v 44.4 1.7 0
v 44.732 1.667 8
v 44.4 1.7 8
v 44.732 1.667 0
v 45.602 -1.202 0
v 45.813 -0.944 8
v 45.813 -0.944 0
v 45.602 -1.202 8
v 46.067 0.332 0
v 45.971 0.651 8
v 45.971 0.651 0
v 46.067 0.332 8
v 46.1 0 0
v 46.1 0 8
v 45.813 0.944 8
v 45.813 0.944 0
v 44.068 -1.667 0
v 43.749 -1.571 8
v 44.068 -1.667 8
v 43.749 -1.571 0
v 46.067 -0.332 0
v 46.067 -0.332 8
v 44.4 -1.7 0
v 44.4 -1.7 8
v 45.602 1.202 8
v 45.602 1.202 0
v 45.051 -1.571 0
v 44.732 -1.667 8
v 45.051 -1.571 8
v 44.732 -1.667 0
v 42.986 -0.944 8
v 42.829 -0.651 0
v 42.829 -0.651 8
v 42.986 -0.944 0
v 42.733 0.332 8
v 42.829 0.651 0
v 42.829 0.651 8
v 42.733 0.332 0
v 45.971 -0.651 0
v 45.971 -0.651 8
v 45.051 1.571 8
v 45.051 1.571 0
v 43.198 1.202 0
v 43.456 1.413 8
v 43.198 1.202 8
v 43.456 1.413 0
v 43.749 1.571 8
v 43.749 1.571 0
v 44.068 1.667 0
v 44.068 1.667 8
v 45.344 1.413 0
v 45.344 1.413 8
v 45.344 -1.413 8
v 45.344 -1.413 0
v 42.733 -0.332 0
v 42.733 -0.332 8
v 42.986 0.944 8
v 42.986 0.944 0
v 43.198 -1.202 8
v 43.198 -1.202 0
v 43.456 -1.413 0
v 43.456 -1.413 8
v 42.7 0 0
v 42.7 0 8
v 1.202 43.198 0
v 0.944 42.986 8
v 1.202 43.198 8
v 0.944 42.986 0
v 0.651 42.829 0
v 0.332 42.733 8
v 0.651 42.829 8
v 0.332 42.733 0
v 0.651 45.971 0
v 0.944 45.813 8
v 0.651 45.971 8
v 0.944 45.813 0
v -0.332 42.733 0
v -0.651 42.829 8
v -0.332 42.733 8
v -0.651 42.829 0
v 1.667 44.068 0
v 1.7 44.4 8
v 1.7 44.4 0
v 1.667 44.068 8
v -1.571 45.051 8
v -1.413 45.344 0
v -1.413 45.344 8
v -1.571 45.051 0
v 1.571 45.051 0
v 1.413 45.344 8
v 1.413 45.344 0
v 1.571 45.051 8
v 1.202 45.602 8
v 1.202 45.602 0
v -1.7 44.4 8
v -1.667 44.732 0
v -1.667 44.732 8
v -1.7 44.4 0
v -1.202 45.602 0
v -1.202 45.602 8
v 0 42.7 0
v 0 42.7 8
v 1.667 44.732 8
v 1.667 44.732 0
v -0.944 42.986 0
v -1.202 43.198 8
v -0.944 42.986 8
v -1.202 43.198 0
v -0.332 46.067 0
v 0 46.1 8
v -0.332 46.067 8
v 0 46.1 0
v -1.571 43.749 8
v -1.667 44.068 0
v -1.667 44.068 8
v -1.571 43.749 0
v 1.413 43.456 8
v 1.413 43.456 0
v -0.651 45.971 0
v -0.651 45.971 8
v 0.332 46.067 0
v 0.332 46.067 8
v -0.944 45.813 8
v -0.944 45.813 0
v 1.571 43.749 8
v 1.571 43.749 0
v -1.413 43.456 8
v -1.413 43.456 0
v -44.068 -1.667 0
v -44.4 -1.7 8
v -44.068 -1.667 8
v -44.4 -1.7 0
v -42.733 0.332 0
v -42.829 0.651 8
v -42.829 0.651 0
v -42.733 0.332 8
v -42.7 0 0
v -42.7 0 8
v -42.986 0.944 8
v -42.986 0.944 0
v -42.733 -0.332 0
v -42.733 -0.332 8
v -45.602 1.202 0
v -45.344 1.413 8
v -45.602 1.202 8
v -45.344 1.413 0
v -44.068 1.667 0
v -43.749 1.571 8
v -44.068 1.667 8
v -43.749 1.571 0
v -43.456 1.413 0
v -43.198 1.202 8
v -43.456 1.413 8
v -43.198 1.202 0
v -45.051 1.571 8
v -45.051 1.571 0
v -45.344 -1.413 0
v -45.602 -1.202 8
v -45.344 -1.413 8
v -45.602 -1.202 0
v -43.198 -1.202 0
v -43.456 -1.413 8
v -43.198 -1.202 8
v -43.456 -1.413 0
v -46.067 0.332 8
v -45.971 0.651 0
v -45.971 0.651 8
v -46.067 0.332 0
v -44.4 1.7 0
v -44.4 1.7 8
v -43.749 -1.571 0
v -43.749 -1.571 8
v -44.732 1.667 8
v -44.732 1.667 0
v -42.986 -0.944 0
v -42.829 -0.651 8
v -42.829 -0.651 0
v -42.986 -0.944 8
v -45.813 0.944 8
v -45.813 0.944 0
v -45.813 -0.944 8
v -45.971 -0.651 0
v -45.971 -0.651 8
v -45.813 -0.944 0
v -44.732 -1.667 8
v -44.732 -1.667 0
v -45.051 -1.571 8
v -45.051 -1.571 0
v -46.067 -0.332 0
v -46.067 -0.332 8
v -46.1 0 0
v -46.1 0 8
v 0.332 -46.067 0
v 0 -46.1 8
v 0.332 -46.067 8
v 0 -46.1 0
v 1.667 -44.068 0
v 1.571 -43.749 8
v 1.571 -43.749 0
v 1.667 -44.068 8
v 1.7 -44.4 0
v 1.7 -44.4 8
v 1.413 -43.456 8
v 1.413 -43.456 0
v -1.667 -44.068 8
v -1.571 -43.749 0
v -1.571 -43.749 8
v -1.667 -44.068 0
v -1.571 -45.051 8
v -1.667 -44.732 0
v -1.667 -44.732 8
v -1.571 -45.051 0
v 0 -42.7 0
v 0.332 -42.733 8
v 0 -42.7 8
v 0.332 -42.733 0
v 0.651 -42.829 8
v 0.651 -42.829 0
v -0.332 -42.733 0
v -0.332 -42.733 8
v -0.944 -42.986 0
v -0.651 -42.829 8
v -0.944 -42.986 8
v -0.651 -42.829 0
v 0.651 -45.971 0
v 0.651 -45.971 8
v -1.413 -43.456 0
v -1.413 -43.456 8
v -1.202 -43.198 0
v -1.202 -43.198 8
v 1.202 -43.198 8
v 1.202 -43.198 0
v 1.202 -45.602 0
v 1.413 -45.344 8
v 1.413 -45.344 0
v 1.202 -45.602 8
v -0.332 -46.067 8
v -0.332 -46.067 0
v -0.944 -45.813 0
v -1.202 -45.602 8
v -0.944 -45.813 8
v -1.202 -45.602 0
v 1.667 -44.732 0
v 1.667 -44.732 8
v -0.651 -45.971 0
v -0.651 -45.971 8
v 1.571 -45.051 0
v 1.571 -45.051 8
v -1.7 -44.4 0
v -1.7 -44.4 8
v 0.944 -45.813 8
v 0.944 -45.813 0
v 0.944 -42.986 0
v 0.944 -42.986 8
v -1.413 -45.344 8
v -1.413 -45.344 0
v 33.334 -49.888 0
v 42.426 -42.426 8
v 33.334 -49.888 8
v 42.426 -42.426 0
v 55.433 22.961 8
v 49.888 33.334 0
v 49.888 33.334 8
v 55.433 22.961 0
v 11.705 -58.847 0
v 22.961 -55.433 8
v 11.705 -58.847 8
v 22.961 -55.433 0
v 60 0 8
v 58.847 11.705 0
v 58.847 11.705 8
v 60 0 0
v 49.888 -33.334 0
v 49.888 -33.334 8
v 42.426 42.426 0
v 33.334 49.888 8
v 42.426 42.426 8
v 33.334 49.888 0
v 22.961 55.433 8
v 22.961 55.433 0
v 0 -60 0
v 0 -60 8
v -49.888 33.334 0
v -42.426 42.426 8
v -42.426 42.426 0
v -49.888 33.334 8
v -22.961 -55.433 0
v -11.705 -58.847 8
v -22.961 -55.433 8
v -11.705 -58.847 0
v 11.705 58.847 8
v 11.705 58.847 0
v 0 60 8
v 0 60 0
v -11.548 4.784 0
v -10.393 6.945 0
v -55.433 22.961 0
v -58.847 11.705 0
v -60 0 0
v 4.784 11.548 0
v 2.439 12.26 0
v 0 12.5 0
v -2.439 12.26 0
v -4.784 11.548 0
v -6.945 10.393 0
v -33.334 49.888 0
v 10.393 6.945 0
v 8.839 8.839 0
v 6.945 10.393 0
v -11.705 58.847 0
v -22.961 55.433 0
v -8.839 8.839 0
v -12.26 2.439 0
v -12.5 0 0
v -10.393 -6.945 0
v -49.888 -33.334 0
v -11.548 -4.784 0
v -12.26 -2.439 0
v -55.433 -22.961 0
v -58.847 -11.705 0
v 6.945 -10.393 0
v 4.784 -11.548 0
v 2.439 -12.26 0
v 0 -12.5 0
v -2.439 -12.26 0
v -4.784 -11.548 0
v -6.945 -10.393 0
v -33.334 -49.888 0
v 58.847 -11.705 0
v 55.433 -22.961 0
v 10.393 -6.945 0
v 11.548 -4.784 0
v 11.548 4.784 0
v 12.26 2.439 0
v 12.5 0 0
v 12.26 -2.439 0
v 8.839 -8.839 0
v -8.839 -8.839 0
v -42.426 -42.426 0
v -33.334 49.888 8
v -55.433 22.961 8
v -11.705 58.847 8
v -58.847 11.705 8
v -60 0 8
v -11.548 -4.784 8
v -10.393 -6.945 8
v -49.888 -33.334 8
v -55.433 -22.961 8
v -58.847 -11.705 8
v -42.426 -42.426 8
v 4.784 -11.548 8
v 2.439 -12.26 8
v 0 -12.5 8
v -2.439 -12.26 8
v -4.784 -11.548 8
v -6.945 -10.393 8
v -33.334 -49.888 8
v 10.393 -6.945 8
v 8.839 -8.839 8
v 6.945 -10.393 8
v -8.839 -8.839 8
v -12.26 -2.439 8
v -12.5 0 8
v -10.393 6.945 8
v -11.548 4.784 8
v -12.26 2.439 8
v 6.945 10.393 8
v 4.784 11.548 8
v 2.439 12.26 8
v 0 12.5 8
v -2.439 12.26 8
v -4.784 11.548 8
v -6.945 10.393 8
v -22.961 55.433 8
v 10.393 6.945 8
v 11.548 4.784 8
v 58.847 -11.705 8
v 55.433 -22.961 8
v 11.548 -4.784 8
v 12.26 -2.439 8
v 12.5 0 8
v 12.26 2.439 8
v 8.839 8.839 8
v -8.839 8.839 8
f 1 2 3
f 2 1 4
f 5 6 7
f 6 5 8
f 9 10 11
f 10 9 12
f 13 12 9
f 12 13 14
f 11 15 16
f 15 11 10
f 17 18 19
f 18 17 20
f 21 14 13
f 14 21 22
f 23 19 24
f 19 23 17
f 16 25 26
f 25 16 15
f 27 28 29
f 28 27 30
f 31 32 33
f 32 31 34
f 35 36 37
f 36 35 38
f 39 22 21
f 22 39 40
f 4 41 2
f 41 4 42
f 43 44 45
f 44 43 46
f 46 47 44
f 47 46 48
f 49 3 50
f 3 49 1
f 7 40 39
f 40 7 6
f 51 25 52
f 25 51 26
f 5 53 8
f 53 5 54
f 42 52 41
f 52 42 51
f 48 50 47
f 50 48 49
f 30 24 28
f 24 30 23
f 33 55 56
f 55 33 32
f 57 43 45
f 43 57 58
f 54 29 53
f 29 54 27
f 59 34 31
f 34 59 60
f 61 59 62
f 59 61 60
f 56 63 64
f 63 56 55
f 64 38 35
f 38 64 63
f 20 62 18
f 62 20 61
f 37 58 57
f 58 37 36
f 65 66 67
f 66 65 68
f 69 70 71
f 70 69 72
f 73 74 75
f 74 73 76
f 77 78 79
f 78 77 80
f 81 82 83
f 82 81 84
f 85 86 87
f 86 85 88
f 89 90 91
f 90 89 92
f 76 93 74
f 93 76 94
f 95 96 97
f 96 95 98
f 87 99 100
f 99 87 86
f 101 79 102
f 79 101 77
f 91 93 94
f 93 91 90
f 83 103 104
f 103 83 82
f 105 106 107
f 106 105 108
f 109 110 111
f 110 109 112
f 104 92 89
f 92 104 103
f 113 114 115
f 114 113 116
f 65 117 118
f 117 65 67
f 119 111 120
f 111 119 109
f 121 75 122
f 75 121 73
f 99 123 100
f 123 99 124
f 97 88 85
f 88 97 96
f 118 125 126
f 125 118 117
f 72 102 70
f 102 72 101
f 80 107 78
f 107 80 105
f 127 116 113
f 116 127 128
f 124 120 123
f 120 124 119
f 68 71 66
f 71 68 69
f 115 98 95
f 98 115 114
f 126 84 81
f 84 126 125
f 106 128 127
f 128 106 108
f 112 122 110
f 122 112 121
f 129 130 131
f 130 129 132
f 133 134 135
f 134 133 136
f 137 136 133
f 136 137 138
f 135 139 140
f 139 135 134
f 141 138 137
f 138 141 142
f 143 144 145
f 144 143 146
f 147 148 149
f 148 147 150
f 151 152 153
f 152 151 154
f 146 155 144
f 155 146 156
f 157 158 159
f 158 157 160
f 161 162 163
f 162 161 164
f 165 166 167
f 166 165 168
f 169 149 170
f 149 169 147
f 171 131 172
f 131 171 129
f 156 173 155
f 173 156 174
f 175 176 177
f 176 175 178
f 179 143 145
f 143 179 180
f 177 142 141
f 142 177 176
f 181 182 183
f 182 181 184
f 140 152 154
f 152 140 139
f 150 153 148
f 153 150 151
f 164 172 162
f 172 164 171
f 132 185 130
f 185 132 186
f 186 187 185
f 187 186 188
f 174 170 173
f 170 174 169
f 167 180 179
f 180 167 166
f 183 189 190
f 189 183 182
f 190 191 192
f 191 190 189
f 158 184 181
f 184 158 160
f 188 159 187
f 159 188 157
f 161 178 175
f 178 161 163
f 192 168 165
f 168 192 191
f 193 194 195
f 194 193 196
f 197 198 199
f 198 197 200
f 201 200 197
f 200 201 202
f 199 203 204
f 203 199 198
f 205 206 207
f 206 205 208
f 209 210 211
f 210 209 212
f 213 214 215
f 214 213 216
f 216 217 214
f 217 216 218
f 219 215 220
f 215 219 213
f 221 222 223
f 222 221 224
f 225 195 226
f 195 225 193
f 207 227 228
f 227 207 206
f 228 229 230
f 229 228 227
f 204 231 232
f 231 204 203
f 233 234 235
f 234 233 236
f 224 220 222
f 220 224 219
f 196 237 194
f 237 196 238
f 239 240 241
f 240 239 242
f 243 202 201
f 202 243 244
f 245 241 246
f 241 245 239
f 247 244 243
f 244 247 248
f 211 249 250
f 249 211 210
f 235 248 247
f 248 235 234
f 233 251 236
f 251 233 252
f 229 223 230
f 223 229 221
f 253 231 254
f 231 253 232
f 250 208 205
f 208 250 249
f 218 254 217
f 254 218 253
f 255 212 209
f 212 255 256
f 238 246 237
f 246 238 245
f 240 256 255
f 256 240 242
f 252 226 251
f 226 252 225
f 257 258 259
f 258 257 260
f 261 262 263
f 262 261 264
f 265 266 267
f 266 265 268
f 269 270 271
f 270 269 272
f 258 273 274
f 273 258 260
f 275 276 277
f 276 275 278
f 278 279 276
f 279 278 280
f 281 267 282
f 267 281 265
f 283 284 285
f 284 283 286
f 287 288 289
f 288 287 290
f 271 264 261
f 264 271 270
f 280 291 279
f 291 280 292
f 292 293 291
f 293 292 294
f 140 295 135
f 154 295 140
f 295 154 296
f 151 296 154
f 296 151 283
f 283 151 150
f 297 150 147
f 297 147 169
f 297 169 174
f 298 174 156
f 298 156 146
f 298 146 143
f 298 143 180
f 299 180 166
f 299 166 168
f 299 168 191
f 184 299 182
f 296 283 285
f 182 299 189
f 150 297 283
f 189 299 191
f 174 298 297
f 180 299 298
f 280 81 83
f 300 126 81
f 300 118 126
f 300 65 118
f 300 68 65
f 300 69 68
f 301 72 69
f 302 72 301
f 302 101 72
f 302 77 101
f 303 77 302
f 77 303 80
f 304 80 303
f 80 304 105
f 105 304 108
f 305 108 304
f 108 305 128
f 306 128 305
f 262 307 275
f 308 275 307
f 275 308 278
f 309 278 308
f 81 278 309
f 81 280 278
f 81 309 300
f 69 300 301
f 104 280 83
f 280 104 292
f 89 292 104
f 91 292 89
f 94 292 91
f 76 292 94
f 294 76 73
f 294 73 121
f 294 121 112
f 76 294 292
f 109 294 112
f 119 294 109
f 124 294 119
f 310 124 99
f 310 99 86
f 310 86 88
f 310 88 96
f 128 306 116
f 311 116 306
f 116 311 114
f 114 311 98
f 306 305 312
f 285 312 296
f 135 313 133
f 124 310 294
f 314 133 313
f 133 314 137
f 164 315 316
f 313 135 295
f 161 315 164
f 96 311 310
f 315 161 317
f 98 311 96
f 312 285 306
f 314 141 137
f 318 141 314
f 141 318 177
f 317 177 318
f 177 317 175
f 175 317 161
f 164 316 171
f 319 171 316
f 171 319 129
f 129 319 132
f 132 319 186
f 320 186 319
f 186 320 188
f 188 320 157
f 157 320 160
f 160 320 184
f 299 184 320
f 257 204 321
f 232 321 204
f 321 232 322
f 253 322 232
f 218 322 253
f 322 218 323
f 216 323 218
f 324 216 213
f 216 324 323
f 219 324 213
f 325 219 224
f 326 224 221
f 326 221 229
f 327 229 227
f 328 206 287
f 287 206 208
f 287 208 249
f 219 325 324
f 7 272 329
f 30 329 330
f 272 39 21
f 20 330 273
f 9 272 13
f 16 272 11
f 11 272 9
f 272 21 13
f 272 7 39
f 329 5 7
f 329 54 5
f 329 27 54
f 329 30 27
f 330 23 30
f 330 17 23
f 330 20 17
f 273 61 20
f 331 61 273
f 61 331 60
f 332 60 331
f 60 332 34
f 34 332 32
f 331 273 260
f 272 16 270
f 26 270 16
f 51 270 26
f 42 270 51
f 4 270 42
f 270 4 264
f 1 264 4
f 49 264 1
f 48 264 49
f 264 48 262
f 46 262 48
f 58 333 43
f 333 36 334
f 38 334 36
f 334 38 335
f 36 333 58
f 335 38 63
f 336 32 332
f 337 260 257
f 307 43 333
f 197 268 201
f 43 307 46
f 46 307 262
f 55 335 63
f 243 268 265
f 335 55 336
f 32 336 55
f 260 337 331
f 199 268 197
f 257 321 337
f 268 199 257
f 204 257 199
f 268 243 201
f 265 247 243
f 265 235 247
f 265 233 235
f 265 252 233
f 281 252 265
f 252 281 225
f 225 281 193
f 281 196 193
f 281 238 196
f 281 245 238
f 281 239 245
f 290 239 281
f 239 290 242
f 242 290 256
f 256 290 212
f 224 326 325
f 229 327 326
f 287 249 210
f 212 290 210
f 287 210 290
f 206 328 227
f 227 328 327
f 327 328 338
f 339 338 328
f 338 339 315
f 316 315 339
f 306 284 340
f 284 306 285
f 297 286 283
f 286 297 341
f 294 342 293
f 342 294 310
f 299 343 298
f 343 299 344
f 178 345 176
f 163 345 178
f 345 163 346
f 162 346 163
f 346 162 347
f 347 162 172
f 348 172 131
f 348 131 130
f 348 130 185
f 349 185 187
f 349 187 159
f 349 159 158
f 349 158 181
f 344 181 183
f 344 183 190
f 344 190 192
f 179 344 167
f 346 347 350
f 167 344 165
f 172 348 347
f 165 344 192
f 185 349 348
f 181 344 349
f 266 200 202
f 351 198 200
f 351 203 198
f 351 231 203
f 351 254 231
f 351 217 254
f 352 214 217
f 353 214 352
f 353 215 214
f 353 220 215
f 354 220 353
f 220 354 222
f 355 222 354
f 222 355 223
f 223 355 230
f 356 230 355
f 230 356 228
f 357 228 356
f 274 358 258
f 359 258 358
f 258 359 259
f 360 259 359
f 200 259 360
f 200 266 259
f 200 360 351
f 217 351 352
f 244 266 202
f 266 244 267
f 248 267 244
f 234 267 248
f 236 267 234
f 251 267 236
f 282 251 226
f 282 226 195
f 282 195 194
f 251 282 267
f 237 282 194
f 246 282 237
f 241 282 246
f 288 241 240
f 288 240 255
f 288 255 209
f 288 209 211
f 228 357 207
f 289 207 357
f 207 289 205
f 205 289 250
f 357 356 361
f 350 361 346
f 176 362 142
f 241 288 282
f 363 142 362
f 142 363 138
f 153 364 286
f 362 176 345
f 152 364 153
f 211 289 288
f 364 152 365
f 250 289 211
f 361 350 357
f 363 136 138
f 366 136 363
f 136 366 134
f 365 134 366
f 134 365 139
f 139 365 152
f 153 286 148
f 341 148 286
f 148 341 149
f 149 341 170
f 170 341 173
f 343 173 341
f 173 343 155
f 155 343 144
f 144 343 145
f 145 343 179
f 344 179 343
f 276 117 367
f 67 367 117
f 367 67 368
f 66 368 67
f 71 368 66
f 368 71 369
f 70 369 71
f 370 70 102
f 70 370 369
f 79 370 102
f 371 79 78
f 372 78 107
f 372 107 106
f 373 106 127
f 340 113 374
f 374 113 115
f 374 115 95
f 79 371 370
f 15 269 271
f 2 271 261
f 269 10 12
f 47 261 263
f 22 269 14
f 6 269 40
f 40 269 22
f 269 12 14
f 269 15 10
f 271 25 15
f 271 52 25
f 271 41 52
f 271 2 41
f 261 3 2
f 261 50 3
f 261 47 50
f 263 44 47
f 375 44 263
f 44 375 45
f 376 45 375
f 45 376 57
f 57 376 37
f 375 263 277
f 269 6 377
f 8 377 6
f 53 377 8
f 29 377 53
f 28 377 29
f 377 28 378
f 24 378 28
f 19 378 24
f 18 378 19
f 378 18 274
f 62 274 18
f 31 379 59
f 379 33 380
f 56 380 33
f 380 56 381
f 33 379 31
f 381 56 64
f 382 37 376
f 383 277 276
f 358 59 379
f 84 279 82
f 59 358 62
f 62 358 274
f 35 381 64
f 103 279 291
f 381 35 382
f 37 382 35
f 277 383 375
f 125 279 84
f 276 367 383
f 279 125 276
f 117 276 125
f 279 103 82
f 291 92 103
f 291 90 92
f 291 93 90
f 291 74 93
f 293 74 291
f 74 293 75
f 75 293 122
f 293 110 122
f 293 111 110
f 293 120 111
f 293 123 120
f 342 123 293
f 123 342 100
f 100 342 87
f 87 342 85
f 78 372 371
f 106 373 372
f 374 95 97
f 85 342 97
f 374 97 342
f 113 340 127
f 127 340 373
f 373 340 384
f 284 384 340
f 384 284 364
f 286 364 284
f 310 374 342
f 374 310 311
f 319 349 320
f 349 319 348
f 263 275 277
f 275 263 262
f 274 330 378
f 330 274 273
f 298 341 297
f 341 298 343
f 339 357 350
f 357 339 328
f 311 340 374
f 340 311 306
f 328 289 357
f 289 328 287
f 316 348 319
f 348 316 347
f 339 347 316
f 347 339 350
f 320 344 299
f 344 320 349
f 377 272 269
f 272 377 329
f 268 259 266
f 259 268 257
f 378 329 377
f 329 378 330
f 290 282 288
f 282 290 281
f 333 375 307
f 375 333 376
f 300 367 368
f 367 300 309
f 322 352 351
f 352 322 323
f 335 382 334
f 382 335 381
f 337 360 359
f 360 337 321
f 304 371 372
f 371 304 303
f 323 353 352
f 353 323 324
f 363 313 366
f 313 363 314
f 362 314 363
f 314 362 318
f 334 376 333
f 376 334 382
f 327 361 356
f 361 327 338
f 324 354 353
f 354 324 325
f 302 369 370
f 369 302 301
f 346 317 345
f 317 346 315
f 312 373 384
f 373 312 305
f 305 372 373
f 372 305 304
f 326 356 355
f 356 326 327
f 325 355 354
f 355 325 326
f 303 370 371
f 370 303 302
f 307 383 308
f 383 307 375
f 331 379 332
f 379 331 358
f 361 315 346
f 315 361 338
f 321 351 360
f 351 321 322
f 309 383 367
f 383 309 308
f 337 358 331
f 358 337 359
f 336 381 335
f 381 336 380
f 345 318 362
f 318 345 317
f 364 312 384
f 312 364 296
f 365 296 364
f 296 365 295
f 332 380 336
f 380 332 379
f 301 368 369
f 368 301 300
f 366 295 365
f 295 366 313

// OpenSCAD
$fn = 32;

// ----------------------------------------------------------------------
// Flange Ø120 x 8
// 4 holes on a Ø88.8 bolt circle, bolted joints
// ----------------------------------------------------------------------

// --- parameters (mm) ---
flange_d = 120;  // outside diameter of the flange
thickness = 8;   // flange thickness
holes = 4;       // number of bolt holes
pcd = 88.8;      // bolt circle diameter
start_deg = 0;   // angle of the first hole, from +X
hole_d = 3.4;    // bolt hole diameter
bore_d = 25;     // central through bore
hub_d = 35;      // hub outside diameter
hub_h = 0;       // hub height above the flange face (0 = no hub)

// --- derived feature positions (mm) ---
height = thickness + hub_h;  // = 8   overall height of the part
pcd_r = pcd / 2;             // = 44.4   bolt circle radius
hole_step = 360 / holes;     // = 90   angular pitch
feature_centers = [
  [pcd_r * cos(start_deg + 0 * hole_step), pcd_r * sin(start_deg + 0 * hole_step)],
  [pcd_r * cos(start_deg + 1 * hole_step), pcd_r * sin(start_deg + 1 * hole_step)],
  [pcd_r * cos(start_deg + 2 * hole_step), pcd_r * sin(start_deg + 2 * hole_step)],
  [pcd_r * cos(start_deg + 3 * hole_step), pcd_r * sin(start_deg + 3 * hole_step)]
];   // bolt hole centres on the pitch circle

// flange disc, every hole and the bore cut straight through
difference() {
  union() {
    cylinder(d = flange_d, h = thickness);
  }
  translate([0, 0, -1]) cylinder(d = bore_d, h = height + 2);  // bore, through
  for (centre = feature_centers)
    translate([centre[0], centre[1], -1]) cylinder(d = hole_d, h = thickness + 2);
}
